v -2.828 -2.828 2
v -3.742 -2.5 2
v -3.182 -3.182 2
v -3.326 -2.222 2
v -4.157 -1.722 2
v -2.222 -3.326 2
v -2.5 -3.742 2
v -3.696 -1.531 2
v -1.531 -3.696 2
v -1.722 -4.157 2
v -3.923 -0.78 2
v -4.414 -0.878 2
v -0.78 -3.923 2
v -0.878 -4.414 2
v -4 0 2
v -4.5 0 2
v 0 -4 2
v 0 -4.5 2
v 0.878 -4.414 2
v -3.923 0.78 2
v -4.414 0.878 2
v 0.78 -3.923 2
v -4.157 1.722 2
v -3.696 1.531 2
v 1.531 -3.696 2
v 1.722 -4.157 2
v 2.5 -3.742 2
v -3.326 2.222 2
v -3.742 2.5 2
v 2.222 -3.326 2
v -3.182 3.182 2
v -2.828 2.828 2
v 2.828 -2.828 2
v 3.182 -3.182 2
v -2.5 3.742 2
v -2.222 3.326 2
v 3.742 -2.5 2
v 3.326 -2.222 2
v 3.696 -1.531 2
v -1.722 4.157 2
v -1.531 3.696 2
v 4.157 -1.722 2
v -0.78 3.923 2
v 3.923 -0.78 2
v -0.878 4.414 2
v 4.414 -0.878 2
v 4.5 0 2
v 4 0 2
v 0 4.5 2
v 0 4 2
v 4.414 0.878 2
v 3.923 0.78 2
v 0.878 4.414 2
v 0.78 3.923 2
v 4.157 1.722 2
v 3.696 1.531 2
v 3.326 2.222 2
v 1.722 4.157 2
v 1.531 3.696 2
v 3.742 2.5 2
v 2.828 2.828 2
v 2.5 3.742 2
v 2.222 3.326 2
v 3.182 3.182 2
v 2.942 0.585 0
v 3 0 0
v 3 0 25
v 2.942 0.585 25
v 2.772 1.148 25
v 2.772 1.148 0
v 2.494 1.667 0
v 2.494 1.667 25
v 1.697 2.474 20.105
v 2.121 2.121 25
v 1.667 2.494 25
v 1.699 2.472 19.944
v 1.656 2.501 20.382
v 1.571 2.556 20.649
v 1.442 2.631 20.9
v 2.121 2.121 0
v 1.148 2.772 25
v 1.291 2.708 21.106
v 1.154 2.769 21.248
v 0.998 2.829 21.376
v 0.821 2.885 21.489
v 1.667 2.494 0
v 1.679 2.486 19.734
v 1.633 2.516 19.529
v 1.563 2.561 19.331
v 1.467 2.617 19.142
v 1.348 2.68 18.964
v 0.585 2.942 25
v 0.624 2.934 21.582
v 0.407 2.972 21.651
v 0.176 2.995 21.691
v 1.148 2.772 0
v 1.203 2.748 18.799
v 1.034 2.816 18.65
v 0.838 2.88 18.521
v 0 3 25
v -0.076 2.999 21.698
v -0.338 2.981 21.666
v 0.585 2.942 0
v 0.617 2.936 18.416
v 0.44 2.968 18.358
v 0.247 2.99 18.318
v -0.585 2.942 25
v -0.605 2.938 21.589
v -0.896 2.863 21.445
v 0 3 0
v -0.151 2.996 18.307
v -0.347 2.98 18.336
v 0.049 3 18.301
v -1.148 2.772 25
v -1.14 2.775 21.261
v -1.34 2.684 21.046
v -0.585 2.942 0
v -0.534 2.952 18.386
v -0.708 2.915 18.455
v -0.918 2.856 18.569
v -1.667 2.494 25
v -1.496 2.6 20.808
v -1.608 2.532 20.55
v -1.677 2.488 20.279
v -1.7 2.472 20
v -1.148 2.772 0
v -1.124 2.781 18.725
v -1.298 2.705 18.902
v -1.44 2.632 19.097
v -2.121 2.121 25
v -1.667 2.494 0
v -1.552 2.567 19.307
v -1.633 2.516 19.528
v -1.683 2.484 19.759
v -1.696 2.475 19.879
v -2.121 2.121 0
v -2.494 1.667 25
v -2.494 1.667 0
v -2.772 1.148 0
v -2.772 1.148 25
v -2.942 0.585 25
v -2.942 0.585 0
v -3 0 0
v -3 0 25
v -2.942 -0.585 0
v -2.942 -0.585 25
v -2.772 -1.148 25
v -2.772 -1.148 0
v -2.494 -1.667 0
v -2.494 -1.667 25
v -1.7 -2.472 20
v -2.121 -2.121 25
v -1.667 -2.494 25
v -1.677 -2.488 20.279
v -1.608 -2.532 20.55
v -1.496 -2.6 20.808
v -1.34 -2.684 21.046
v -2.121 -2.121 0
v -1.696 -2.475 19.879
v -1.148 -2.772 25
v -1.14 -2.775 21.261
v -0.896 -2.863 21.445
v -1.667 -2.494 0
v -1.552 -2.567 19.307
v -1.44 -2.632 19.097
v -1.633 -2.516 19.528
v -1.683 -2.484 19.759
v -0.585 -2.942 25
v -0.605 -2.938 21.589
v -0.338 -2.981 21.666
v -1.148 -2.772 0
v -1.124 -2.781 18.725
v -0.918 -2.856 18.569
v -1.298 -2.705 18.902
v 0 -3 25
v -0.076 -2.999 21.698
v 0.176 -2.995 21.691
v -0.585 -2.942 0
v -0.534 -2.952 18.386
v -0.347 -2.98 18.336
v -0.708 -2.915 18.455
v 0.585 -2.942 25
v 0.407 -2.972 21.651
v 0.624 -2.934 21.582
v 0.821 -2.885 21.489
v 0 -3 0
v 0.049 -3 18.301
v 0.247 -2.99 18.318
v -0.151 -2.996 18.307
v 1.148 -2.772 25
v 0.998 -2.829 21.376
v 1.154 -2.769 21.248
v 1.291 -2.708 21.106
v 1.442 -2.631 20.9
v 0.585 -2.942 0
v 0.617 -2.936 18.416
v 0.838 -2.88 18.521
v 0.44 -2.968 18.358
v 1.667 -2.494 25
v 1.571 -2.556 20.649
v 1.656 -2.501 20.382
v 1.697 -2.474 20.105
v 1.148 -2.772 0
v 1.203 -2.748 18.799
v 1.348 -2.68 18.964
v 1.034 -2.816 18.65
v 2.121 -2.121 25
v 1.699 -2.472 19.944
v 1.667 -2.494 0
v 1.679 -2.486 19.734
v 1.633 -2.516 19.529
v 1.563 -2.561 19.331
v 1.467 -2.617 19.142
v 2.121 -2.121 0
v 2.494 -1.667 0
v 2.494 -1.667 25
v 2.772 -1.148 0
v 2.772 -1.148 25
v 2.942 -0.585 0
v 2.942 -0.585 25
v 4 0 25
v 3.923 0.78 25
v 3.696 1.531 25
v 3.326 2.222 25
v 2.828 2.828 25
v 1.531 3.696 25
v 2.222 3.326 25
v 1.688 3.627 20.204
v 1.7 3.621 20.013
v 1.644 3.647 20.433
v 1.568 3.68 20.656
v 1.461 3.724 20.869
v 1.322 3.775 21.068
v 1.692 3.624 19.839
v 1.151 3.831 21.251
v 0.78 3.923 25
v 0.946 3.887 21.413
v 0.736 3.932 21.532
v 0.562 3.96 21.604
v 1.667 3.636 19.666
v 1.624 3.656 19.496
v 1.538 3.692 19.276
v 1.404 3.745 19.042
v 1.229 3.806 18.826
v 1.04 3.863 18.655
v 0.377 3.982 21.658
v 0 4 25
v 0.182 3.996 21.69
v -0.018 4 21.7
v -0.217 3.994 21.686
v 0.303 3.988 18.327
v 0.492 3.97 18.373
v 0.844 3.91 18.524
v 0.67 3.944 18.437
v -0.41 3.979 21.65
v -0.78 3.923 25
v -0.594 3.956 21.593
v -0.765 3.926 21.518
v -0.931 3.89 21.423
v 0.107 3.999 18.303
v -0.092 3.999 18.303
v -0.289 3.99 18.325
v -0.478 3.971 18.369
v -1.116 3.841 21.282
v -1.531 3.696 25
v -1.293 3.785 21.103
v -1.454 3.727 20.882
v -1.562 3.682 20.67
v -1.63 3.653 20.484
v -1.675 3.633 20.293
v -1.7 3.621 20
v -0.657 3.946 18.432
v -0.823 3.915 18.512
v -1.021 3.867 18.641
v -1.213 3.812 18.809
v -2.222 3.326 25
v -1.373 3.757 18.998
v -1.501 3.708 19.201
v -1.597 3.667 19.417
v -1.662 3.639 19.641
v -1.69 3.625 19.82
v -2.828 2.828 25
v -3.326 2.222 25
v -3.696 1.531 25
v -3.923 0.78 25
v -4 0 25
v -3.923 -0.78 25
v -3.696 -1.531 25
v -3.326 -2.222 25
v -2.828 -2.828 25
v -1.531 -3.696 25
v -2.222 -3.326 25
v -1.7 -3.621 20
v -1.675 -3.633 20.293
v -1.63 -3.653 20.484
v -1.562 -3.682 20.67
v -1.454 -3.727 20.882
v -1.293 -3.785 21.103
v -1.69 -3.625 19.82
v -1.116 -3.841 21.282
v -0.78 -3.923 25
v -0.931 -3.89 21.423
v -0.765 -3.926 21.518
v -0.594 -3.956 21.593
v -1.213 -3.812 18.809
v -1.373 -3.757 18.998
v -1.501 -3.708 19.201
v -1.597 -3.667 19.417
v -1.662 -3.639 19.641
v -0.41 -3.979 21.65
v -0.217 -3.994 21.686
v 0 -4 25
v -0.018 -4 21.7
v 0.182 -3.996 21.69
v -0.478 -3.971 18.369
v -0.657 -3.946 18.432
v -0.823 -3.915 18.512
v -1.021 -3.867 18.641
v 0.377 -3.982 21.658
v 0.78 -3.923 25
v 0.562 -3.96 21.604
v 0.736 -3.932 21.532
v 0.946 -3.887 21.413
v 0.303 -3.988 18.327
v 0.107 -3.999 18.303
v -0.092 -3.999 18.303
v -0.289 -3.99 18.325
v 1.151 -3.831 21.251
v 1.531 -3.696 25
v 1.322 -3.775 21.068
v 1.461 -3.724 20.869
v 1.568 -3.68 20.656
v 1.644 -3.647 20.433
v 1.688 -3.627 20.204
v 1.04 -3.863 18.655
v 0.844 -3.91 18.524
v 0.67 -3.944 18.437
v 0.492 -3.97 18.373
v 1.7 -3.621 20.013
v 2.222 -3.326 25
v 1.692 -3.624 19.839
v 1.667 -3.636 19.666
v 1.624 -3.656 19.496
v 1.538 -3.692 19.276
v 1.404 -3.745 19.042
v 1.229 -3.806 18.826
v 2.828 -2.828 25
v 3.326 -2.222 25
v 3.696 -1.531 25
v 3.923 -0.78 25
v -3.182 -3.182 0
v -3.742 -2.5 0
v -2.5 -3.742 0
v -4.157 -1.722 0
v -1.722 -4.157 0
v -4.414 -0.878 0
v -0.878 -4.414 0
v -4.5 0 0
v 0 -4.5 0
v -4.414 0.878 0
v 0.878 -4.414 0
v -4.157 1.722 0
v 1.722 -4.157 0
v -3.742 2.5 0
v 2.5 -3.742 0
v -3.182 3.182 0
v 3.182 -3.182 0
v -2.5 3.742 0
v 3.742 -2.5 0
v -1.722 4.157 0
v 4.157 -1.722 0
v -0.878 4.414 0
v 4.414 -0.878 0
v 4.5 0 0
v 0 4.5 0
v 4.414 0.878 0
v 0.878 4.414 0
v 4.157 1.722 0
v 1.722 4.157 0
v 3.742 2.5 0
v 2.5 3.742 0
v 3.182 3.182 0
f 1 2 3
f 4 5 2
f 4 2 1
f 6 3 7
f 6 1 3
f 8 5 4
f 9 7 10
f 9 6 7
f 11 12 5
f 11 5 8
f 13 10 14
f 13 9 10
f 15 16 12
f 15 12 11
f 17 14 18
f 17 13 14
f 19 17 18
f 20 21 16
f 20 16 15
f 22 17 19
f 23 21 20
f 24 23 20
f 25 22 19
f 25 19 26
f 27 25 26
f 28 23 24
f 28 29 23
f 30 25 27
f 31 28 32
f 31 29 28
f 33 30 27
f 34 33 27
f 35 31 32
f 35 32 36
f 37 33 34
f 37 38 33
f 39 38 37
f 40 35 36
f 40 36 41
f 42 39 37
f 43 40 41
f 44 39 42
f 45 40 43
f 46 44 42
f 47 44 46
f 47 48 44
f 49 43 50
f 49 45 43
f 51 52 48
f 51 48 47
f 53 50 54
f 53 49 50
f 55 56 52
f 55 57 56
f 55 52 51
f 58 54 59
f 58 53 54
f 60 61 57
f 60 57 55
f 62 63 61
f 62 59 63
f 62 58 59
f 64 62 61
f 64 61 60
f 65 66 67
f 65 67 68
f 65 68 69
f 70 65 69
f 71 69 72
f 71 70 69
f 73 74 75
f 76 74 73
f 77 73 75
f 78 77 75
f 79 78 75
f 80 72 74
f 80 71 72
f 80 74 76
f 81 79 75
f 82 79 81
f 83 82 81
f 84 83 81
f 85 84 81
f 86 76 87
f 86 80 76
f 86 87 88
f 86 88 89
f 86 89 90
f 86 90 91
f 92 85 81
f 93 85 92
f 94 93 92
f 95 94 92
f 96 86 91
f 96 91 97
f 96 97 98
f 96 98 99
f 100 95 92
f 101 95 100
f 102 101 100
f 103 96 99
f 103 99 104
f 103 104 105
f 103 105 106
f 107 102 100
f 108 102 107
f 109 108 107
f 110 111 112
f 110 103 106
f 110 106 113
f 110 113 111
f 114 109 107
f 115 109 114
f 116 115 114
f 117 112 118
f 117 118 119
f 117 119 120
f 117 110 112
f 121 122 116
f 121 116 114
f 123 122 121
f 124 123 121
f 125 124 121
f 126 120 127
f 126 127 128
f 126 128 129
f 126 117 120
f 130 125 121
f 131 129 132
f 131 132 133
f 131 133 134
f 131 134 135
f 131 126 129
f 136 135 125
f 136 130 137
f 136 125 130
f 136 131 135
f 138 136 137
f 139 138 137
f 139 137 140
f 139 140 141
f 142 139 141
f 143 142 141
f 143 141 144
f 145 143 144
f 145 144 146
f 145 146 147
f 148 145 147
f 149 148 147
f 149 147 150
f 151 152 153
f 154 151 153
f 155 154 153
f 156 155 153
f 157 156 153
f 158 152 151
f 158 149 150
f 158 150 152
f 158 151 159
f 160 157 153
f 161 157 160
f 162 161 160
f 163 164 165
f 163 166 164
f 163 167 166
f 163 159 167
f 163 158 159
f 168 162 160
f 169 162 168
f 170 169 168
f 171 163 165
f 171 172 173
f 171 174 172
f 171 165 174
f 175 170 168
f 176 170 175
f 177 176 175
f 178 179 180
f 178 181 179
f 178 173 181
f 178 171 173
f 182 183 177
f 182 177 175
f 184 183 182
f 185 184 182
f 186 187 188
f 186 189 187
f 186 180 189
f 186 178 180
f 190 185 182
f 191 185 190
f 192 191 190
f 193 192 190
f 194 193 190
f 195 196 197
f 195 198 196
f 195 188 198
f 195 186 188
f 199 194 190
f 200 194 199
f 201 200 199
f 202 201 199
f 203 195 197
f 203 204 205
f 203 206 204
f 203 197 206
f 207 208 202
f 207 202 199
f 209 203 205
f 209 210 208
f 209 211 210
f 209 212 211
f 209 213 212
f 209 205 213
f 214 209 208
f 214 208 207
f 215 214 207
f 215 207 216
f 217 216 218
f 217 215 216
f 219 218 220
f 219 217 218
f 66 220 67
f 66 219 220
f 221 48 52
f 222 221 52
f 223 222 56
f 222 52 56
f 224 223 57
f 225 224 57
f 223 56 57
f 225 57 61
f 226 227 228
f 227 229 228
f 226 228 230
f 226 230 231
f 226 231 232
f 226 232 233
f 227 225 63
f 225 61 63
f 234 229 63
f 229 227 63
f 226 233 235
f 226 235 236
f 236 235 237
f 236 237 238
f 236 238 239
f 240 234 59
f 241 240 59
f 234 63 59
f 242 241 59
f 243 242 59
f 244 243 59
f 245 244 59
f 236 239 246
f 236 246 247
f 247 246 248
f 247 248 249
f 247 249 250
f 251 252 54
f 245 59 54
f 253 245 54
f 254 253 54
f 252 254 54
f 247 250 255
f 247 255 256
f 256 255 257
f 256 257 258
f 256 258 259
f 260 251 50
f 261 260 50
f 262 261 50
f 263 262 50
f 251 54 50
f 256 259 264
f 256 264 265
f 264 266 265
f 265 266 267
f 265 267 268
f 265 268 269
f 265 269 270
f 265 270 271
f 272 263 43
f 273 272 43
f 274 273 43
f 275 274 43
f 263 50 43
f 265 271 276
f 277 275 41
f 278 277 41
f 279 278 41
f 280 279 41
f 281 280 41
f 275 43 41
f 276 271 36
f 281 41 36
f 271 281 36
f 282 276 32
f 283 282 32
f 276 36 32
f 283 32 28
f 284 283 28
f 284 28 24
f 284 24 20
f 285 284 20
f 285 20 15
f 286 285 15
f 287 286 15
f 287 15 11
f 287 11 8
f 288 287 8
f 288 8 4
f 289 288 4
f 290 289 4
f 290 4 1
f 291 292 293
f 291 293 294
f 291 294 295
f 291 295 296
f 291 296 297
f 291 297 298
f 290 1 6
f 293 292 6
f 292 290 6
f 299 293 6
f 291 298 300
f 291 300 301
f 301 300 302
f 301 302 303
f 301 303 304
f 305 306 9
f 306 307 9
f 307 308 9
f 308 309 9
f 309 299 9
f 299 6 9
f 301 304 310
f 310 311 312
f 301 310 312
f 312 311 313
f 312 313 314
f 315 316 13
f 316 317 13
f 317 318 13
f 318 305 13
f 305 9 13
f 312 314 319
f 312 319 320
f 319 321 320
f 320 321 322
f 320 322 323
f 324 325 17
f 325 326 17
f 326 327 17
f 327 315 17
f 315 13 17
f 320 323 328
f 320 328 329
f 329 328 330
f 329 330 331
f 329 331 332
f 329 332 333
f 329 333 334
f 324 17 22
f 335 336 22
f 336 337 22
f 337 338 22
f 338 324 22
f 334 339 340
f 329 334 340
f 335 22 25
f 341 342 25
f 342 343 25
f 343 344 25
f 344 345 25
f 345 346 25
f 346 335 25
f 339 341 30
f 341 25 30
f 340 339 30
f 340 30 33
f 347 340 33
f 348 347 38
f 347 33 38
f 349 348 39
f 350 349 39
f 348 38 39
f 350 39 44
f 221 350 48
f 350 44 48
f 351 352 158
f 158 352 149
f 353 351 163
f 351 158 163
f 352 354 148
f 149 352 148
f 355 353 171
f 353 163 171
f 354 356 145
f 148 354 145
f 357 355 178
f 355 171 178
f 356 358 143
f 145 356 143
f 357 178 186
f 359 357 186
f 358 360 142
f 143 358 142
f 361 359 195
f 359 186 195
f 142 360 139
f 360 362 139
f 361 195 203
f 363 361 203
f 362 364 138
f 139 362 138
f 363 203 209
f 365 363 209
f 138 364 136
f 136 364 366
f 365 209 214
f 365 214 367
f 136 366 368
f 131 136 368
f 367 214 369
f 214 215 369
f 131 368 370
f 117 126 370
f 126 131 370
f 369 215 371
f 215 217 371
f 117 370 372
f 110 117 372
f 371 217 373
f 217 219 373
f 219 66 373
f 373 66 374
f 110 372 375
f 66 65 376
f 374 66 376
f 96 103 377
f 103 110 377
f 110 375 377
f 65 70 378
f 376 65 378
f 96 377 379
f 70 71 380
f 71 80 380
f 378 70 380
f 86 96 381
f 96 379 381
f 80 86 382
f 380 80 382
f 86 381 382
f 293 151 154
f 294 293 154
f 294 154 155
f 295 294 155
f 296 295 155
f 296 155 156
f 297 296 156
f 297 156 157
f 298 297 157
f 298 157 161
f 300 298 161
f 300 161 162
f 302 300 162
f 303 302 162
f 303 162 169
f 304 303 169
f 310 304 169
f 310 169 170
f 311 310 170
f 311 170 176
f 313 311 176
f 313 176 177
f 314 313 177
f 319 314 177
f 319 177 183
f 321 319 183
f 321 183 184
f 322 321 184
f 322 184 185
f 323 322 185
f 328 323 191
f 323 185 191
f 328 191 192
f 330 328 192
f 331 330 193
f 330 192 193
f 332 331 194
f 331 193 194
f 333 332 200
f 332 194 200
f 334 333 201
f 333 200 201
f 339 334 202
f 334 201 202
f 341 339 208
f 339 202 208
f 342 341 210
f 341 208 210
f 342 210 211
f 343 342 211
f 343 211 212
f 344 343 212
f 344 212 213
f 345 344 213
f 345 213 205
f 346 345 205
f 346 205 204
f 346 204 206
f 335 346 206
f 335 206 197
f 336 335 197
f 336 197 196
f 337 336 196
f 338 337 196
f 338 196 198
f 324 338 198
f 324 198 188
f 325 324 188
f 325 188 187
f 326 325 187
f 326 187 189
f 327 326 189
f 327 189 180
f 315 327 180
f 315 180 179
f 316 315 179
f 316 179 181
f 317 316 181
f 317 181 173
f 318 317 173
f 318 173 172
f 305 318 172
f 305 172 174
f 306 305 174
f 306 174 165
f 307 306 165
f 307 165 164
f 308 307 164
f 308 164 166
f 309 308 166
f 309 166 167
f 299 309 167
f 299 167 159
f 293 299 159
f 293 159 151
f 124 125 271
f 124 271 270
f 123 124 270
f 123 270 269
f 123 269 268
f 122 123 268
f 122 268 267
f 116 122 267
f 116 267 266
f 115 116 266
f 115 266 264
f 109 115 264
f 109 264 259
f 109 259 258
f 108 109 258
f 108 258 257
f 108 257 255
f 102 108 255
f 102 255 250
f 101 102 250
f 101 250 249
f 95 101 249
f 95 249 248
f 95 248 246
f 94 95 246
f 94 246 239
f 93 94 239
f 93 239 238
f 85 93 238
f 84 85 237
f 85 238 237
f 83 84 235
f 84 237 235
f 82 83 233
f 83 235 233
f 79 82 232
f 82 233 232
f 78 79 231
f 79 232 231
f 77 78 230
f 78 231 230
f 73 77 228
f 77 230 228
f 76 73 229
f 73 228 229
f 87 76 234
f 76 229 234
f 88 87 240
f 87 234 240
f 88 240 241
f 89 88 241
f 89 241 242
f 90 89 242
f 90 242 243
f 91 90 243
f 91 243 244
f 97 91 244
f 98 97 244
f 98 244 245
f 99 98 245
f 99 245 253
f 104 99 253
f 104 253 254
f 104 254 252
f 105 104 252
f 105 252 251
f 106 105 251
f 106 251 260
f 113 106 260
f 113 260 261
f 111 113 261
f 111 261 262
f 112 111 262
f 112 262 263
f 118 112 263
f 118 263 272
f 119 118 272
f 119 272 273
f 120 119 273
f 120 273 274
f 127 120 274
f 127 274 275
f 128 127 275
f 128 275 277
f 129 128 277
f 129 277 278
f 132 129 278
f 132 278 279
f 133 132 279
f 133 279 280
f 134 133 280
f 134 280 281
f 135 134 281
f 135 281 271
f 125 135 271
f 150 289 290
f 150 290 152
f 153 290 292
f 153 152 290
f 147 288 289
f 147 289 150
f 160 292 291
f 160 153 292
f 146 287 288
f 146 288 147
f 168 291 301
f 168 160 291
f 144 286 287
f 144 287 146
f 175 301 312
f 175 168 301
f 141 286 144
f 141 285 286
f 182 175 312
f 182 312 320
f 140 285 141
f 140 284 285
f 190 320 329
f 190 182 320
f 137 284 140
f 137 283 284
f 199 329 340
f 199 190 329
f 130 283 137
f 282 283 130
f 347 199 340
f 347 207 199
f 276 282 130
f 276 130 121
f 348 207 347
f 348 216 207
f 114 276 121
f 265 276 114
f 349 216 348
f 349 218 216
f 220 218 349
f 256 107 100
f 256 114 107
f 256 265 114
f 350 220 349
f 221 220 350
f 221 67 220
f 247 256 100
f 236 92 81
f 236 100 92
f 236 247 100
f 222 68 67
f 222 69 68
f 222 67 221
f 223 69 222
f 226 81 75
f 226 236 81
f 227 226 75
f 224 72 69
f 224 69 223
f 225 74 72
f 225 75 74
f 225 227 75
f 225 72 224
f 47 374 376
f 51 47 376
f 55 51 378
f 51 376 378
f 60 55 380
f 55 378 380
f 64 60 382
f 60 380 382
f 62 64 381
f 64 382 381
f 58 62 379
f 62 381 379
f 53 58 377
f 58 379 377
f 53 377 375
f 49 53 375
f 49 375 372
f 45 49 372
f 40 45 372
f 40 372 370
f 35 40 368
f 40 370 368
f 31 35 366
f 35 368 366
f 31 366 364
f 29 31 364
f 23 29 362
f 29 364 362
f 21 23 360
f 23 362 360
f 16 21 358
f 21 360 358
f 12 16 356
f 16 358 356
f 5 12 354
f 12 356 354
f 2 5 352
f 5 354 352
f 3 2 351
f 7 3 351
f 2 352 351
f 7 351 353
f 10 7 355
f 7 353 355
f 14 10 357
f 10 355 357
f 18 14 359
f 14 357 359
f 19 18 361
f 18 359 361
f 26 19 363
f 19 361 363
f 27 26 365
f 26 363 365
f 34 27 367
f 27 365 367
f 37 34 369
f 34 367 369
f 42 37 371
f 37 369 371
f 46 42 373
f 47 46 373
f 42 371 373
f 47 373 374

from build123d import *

# Parameters (mm, degrees)
F0_R     = 4
F0_R_2   = 3
F1_DEPTH = 25
F0_R_3   = 4.5
F2_DEPTH = 2
F5_D     = 3.4


with BuildPart() as f1:
    # F0 (on Top) → F1 (new body)
    with BuildSketch(Plane.XY):
        Circle(F0_R)
        Circle(F0_R_2, mode=Mode.SUBTRACT)
    extrude(amount=F1_DEPTH)

    # F0 (on Top) → F2 (join)
    with BuildSketch(Plane.XY):
        Circle(F0_R_3)
        Circle(F0_R, mode=Mode.SUBTRACT)
    extrude(amount=F2_DEPTH)

    # F5 (through all)
    with Locations(Plane.XZ.offset(4)):
        with Locations((0, 20)):
            Hole(F5_D / 2)


solid = f1.part
